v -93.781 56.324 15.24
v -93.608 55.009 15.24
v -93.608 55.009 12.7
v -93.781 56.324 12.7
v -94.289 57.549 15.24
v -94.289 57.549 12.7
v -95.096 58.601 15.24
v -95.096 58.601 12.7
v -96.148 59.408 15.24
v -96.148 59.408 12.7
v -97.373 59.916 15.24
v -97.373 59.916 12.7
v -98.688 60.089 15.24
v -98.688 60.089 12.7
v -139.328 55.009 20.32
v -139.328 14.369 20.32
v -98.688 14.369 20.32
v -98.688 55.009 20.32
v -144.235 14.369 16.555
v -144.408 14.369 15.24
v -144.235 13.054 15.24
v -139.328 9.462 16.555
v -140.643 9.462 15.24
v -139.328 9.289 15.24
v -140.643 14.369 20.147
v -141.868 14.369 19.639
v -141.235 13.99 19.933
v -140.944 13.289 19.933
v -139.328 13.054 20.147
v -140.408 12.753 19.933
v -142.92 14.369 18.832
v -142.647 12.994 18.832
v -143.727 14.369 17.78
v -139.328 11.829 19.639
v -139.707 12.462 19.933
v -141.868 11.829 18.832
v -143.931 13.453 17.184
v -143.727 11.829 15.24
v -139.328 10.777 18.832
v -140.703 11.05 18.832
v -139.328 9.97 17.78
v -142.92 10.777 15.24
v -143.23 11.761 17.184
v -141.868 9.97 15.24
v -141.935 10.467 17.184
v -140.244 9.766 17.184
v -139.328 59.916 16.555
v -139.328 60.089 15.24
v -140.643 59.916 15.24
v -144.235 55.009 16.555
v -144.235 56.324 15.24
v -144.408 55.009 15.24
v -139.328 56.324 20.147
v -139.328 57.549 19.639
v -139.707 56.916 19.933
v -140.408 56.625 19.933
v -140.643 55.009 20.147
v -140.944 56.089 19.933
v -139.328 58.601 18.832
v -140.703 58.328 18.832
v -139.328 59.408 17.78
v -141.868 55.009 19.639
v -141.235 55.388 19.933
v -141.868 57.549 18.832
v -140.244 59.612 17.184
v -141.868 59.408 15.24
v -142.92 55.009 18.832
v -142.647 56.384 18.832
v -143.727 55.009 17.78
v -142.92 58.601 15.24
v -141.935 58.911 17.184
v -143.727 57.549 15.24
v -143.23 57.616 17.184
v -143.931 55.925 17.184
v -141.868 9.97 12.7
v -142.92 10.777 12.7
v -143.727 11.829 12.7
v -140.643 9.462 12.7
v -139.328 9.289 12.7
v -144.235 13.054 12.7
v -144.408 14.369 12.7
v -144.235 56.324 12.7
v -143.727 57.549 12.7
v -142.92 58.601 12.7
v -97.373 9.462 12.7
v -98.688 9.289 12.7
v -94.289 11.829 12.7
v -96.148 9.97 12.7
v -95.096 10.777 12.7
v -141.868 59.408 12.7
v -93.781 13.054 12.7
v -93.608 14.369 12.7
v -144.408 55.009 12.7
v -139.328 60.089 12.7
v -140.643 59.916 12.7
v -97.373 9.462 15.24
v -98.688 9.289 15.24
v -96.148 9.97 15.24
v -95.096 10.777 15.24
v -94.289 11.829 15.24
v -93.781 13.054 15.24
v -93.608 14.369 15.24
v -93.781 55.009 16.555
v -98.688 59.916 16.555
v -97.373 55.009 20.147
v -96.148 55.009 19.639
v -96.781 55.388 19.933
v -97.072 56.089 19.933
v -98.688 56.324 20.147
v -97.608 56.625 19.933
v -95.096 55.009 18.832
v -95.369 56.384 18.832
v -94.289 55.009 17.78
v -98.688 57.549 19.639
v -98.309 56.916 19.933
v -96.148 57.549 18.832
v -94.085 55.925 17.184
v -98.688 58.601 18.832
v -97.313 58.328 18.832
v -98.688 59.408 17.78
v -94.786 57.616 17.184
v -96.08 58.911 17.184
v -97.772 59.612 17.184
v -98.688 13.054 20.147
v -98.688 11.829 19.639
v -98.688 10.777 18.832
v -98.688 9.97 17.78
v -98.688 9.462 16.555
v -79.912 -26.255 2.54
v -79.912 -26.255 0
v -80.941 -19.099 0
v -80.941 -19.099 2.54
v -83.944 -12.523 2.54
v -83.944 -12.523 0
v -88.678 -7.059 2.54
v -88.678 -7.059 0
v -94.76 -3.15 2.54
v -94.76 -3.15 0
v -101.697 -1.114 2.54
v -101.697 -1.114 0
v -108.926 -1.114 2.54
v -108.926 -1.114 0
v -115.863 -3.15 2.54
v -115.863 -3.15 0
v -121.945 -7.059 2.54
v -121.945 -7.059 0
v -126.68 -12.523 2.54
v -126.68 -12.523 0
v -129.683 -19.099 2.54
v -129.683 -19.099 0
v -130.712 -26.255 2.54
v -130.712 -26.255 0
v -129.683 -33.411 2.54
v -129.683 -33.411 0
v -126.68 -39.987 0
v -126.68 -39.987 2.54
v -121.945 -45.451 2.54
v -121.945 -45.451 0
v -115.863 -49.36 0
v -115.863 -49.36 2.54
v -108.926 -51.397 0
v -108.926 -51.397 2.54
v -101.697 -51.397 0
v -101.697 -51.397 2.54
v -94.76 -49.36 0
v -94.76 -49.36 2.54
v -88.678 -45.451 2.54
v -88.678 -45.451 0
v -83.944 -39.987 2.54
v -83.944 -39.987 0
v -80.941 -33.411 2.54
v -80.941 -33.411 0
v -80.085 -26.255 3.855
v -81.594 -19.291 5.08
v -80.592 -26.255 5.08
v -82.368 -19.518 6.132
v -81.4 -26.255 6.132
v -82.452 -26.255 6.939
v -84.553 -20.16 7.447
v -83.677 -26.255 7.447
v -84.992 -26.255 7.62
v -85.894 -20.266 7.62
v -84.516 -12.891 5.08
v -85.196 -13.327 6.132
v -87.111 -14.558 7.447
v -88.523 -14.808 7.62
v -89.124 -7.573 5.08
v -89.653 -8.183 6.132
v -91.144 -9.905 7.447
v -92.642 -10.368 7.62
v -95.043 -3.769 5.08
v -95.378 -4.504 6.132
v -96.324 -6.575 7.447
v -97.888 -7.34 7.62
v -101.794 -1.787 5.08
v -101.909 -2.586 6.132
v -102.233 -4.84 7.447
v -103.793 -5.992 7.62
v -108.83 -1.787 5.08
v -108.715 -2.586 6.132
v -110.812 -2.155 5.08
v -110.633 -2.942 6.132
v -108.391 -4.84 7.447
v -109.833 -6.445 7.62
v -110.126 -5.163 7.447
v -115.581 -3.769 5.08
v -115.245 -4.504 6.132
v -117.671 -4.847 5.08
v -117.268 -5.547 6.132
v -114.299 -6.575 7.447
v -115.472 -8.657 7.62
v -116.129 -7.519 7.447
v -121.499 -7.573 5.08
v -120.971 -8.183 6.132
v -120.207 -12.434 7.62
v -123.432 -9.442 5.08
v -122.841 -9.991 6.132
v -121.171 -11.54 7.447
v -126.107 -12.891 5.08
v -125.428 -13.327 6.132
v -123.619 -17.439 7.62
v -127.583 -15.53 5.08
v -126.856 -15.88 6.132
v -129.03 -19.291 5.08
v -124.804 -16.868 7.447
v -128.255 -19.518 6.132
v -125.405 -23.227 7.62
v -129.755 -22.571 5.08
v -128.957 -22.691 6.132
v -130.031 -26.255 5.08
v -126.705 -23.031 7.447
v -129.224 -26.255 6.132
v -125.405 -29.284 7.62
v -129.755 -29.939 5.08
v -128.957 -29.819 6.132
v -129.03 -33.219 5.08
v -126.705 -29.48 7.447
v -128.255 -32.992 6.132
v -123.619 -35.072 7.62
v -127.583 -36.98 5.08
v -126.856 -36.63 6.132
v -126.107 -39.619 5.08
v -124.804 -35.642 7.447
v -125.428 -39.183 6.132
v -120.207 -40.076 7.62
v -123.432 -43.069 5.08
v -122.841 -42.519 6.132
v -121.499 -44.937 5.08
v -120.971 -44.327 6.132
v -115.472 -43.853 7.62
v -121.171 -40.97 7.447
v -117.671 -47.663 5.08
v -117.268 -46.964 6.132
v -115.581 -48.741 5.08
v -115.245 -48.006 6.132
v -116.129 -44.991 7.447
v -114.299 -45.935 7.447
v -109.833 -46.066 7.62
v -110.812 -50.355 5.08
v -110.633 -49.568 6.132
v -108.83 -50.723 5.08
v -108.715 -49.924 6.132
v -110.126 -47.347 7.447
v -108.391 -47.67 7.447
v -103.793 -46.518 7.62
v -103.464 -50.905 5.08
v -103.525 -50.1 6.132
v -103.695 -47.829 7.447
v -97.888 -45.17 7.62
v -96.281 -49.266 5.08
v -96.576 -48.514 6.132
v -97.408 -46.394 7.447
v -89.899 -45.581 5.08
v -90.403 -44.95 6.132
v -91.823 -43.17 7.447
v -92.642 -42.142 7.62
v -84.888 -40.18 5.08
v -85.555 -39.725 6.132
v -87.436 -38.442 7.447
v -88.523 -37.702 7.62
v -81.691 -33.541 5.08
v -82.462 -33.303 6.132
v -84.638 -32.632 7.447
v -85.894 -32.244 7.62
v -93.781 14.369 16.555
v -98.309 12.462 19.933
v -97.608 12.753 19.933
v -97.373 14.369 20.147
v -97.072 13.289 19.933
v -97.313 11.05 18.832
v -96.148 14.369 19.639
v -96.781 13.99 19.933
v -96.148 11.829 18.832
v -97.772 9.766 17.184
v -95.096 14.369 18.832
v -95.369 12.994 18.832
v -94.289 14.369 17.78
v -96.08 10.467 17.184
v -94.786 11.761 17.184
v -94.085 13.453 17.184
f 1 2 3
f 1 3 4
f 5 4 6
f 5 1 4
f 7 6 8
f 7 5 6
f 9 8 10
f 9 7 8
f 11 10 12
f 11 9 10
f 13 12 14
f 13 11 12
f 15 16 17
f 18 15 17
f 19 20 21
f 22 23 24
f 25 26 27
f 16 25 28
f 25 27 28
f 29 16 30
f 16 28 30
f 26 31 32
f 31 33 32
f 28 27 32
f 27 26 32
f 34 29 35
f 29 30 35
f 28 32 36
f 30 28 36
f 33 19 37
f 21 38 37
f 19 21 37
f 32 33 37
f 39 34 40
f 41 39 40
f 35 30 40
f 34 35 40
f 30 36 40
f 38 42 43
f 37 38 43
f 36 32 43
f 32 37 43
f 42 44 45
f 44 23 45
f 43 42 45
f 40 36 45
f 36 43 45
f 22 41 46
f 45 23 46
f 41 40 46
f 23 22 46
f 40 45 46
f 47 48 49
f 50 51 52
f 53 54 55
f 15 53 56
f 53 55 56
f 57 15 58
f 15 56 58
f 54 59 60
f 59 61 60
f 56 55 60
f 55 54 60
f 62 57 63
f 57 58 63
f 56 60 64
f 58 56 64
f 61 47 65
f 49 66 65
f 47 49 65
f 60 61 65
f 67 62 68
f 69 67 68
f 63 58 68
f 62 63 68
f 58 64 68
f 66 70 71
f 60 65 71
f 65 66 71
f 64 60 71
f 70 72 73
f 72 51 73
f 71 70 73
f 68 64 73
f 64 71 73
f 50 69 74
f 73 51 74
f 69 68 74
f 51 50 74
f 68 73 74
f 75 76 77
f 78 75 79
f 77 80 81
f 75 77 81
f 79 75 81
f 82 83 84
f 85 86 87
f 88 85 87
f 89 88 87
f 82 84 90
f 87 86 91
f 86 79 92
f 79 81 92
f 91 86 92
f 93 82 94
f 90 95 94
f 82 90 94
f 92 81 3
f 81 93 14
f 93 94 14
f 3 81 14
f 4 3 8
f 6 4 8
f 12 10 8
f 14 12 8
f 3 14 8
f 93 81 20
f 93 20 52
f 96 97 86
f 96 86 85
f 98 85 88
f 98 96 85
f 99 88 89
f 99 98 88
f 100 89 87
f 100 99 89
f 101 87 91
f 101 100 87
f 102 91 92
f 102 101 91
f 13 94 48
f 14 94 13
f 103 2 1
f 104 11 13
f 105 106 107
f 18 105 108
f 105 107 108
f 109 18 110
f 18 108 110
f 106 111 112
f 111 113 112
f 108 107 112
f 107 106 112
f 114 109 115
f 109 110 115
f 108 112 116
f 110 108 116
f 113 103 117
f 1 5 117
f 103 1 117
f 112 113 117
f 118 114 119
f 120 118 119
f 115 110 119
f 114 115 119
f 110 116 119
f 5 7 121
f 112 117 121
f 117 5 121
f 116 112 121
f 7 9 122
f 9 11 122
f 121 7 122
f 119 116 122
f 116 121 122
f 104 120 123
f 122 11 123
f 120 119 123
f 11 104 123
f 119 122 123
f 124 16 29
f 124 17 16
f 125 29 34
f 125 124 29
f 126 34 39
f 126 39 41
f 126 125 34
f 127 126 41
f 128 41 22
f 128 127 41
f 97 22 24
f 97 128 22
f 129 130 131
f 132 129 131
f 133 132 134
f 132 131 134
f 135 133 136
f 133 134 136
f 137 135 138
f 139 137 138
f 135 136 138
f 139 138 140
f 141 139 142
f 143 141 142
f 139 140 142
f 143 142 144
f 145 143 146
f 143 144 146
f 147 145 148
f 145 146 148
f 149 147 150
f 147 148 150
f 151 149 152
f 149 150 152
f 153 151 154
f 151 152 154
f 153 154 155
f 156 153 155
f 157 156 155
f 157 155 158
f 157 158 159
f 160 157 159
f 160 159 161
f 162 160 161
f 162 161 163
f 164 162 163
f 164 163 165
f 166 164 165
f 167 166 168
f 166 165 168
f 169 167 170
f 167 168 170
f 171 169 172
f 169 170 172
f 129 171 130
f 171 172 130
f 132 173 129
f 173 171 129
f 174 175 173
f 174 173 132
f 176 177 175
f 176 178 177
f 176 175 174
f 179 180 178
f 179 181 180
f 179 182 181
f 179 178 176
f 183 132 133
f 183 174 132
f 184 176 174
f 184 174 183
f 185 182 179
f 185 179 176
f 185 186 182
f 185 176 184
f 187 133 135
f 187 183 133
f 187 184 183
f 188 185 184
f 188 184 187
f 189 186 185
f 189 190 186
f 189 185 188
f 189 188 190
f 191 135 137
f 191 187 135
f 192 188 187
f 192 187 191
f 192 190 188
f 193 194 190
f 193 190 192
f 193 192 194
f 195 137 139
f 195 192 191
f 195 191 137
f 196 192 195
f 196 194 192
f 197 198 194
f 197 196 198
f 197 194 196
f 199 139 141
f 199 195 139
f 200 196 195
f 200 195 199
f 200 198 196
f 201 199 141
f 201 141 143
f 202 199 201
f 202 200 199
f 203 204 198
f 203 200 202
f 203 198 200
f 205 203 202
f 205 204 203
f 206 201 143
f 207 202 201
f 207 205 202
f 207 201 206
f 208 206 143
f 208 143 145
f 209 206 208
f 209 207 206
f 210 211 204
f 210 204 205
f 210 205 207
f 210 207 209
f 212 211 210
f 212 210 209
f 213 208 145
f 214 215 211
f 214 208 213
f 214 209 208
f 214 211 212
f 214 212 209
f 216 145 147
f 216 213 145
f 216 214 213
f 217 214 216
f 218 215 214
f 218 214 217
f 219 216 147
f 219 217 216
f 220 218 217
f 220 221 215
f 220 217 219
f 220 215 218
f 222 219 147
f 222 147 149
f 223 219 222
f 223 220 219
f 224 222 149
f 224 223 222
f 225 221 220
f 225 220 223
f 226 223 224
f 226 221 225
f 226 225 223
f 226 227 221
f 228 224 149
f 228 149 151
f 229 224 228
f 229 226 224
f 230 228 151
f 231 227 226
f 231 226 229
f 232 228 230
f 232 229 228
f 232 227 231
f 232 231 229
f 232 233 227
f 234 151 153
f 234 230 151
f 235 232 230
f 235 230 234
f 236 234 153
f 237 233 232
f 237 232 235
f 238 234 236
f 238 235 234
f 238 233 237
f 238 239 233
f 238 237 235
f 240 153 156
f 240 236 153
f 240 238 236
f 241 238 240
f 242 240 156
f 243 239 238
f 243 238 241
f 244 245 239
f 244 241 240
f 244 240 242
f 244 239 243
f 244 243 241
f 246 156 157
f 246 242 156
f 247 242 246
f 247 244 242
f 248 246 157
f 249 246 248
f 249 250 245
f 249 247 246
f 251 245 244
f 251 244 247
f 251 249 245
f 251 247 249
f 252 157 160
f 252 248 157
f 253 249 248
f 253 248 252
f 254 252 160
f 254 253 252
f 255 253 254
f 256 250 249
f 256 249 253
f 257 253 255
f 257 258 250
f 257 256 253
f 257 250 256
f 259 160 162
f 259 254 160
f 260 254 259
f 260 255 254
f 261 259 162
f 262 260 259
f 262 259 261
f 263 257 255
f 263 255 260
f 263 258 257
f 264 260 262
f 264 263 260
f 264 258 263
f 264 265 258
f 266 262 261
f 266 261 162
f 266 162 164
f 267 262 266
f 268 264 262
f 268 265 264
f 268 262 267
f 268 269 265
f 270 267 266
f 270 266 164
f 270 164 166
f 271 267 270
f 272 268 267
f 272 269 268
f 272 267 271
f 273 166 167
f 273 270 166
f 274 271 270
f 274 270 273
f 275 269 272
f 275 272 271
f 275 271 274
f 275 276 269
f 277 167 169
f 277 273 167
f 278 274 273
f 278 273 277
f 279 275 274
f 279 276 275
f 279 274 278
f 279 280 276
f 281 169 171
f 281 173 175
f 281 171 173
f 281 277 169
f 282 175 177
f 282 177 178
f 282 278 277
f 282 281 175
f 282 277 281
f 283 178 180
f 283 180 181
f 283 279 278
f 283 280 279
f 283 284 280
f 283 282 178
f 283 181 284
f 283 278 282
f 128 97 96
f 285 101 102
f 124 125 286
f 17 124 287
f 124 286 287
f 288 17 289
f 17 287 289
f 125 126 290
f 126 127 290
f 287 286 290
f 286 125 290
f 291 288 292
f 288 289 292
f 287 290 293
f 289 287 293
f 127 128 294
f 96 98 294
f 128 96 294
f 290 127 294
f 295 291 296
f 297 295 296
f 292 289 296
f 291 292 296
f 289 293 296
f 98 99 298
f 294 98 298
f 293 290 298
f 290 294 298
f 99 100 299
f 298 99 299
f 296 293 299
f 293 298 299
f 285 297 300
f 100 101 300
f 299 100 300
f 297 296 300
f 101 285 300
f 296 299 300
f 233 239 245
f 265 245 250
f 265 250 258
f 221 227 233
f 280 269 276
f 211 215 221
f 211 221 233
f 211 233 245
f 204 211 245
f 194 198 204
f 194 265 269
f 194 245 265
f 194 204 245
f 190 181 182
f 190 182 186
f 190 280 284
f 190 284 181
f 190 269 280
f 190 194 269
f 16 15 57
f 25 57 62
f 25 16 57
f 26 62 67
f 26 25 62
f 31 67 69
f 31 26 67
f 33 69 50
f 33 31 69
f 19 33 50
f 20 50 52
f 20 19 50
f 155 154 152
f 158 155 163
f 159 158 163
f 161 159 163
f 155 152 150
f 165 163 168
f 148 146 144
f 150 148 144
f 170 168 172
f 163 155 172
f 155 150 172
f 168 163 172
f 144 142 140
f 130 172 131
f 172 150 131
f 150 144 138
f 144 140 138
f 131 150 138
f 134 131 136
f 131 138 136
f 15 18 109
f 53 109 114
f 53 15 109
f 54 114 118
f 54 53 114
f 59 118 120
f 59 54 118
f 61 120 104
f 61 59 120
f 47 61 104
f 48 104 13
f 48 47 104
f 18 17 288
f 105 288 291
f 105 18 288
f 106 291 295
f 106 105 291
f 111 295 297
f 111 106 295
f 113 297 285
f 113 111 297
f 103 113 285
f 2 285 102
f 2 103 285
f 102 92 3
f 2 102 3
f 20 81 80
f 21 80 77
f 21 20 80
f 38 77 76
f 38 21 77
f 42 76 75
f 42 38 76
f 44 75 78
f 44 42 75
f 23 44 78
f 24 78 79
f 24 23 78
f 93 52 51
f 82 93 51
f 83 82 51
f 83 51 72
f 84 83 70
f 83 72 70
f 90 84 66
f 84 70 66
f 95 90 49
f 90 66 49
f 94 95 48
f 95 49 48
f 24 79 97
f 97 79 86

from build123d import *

# Parameters (mm, degrees)
F1_R     = 25.4
F2_DEPTH = 7.62
F3_R     = 5.08
F4_W     = 50.8
F4_H     = 50.8
F5_DEPTH = 7.62
F6_R     = 5.08
F7_R     = 5.08


with BuildPart() as f2:
    # F1 (on Top) → F2 (new body)
    with BuildSketch(Plane.XY):
        with Locations((-105.311699, -26.255054)):
            Circle(F1_R)
    extrude(amount=F2_DEPTH)

    # F3
    f3_edges = [f2.edges().sort_by_distance(p)[0] for p in [
        (-130.711699, -26.255054, 7.62),
    ]]
    fillet(f3_edges, radius=F3_R)


with BuildPart() as f5:
    # F4 (on offset) → F5 (new body)
    with BuildSketch(Plane.XY.offset(12.7)):
        with Locations((-119.007931, 34.68895)):
            Rectangle(F4_W, F4_H)
    extrude(amount=F5_DEPTH)

    # F6
    f6_edges = [f5.edges().sort_by_distance(p)[0] for p in [
        (-93.607931, 60.08895, 16.51),
        (-93.607931, 9.28895, 16.51),
        (-144.407931, 60.08895, 16.51),
        (-144.407931, 9.28895, 16.51),
    ]]
    fillet(f6_edges, radius=F6_R)

    # F7
    f7_edges = [f5.edges().sort_by_distance(p)[0] for p in [
        (-119.007931, 9.28895, 20.32),
        (-142.920034, 10.776847, 20.32),
        (-95.095829, 10.776847, 20.32),
        (-144.407931, 34.68895, 20.32),
        (-93.607931, 34.68895, 20.32),
        (-142.920034, 58.601052, 20.32),
        (-95.095829, 58.601052, 20.32),
        (-119.007931, 60.08895, 20.32),
    ]]
    fillet(f7_edges, radius=F7_R)


solid = Compound([f2.part, f5.part])
